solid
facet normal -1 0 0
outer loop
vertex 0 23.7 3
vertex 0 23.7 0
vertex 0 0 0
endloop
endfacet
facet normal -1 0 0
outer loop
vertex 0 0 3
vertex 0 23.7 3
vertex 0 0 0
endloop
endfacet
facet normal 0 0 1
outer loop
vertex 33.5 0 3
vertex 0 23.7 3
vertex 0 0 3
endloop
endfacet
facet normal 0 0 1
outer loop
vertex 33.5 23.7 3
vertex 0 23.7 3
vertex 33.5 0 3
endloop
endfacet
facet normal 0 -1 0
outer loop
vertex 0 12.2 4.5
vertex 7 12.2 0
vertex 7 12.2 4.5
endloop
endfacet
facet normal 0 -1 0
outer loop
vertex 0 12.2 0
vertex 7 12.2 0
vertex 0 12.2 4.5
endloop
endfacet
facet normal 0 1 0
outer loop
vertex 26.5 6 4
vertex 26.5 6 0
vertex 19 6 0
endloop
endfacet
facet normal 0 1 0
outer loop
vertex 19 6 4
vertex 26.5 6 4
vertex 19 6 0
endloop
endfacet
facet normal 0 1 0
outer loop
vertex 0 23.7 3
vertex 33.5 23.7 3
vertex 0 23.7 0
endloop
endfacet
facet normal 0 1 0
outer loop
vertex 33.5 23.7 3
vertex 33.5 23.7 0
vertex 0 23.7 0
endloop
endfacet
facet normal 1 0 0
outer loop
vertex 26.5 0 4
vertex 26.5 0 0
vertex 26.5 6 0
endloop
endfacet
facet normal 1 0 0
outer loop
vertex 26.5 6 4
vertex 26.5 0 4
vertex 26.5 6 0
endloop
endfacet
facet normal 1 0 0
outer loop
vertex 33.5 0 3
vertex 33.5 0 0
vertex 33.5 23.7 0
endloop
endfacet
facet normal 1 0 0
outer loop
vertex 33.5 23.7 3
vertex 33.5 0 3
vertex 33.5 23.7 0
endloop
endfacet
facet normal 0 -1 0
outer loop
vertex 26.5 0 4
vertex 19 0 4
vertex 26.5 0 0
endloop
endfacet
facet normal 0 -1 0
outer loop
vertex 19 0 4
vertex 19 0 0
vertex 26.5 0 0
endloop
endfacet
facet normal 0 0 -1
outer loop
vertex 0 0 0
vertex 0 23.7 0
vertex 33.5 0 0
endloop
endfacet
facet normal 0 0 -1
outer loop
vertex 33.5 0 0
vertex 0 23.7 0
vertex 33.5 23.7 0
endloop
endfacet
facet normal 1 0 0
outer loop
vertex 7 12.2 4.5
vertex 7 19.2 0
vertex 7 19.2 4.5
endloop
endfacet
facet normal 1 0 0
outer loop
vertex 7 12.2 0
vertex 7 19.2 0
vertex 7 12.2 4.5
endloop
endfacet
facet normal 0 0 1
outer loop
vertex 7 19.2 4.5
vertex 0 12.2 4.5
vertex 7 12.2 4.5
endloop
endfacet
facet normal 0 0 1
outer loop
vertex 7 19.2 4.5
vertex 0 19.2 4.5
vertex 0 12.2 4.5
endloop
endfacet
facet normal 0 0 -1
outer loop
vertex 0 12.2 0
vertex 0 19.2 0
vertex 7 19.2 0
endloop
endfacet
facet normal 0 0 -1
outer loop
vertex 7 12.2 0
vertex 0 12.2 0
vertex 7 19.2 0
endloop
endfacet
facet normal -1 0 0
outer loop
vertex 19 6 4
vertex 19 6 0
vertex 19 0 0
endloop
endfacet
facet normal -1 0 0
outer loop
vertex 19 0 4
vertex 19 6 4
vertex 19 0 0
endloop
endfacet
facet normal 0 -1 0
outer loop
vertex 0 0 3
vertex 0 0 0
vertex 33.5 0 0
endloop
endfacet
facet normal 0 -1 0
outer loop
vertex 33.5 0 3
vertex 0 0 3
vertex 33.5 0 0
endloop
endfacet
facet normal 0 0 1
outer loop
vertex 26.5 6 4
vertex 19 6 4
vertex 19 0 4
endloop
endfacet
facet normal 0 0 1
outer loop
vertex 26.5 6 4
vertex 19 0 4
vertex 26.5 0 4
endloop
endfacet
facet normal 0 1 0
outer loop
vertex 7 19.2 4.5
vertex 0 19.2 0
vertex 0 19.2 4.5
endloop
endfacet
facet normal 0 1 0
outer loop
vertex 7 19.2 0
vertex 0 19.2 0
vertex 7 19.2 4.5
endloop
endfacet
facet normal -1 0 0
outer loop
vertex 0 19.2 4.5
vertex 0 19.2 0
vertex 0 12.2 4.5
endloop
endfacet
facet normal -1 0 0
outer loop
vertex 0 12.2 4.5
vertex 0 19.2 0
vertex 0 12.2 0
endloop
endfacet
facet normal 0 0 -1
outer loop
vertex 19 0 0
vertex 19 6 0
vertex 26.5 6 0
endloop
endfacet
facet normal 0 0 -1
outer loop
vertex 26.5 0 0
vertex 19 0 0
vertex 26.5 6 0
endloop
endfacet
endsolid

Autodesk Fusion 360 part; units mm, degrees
sketch "Sketch1" plane through (0, 0, 0) normal (0, 0, 1) x (1, 0, 0)
  line L0 (0, 0) -> (33.5, 0)
  line L1 (33.5, 0) -> (33.5, 23.7)
  line L2 (33.5, 23.7) -> (0, 23.7)
  line L3 (0, 23.7) -> (0, 0)
  line L4 (0, 19.2) -> (7, 19.2)
  line L5 (7, 19.2) -> (7, 12.2)
  line L6 (7, 12.2) -> (0, 12.2)
  line L7 (0, 12.2) -> (0, 19.2)
  line L8 (19, 0) -> (26.5, 0)
  line L9 (26.5, 0) -> (26.5, 6)
  line L10 (26.5, 6) -> (19, 6)
  line L11 (19, 6) -> (19, 0)
  dimension "d1" = 33.5
  dimension "d2" = 23.7
  dimension "d5" = 7
  dimension "d6" = 7
  dimension "d7" = 4.5
  dimension "d8" = 7.5
  dimension "d9" = 6
  dimension "d10" = 7
extrude "Extrude1" add sketch "Sketch1" along normal blind 3 makes body 1
extrude "Extrude2" add sketch "Sketch1" along normal blind 4.5 separate body contours L3 L4 L5 L6 L7 makes body 2
extrude "Extrude3" add sketch "Sketch1" along normal blind 4 separate body contours L0 L8 L9 L10 L11 makes body 3
